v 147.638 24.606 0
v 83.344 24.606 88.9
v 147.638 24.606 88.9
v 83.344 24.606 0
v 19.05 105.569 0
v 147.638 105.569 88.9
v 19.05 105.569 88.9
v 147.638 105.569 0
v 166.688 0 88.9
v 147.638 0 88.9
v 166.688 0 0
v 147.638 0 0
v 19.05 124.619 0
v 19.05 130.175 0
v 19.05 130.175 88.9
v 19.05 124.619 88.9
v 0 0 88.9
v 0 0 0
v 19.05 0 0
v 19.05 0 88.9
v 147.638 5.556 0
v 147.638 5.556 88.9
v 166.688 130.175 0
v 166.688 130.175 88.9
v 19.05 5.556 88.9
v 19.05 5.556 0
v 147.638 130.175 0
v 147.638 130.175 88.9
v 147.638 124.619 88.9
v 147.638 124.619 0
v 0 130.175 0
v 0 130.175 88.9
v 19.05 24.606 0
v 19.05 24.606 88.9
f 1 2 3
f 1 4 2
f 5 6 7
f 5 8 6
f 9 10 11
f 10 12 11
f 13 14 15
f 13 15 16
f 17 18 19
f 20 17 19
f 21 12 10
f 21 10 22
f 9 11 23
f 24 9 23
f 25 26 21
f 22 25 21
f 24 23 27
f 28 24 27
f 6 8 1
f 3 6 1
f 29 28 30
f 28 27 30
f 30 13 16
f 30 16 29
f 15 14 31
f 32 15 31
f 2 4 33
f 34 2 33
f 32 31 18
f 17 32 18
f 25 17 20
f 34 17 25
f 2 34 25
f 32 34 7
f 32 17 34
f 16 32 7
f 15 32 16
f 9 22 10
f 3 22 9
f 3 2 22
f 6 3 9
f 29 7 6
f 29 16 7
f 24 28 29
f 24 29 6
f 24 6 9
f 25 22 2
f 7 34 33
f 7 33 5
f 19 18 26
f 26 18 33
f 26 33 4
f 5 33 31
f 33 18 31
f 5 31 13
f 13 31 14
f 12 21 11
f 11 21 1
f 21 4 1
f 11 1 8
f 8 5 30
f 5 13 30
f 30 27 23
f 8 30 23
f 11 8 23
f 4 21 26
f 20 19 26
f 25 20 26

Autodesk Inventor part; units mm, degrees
ref_plane "YZ Plane" through (0, 0, 0) normal (1, 0, 0) x (0, 1, 0)
ref_plane "XZ Plane" through (0, 0, 0) normal (0, 1, 0) x (-1, 0, 0)
ref_plane "XY Plane" through (0, 0, 0) normal (0, 0, 1) x (1, 0, 0)
sketch "Sketch1" plane through (0, 0, 0) normal (0, 0, 1) x (1, 0, 0)
  line L0 (0, 0) -> (166.6875, 0)
  line L1 (166.6875, 0) -> (166.6875, 130.175)
  line L2 (166.6875, 130.175) -> (0, 130.175)
  line L3 (0, 130.175) -> (0, 0)
  dimension "d0" = 166.6875
  dimension "d1" = 130.175
extrude "Extrusion1" add sketch "Sketch1" along normal blind 88.9
sketch "Sketch3" plane through (0, 0, 0) normal (0, 0, -1) x (-1, 0, 0)
  line L0 (-166.6875, 0) -> (-166.6875, 130.175) construction
  line L1 (0, 0) -> (-166.6875, 0) projected
  line L2 (0, 130.175) -> (0, 0) construction
  line L3 (-166.6875, 130.175) -> (0, 130.175) construction
  line L4 (-166.6875, 0) -> (-147.6375, 0) construction
  line L5 (-147.6375, 0) -> (-147.6375, 5.5563)
  line L6 (0, 0) -> (-166.6875, 0) construction
  line L7 (-83.3438, 0) -> (-83.3438, 30.0341) construction
  line L8 (-166.6875, 0) -> (0, 0) construction
  line L9 (0, 0) -> (-19.05, 0) construction
  line L10 (-19.05, 0) -> (-19.05, 5.5563)
  line L11 (-166.6875, 0) -> (0, 0) construction
  line L12 (-19.05, 5.5563) -> (-147.6375, 5.5563)
  line L13 (-147.6375, 5.5563) -> (-19.05, 5.5563)
  line L14 (-19.05, 5.5563) -> (-19.05, 0)
  line L15 (-19.05, 0) -> (-147.6375, 0)
  line L16 (-147.6375, 0) -> (-147.6375, 5.5563)
  line L17 (-166.6875, 65.0875) -> (-112.8864, 65.0875) construction
  line L18 (-147.6375, 130.175) -> (-147.6375, 124.6187)
  line L19 (-19.05, 130.175) -> (-19.05, 124.6187)
  line L20 (-19.05, 124.6187) -> (-147.6375, 124.6187)
  line L21 (-147.6375, 124.6187) -> (-19.05, 124.6187)
  line L22 (-19.05, 124.6187) -> (-19.05, 130.175)
  line L23 (-19.05, 130.175) -> (-147.6375, 130.175)
  line L24 (-147.6375, 130.175) -> (-147.6375, 124.6187)
  point P0 (-83.3438, 130.175)
extrude "Extrusion2" cut sketch "Sketch3" against normal through all
sketch "Sketch4" plane through (0, 0, 0) normal (0, 0, -1) x (-1, 0, 0)
  line L0 (-147.6375, 124.6187) -> (-147.6375, 130.175) projected
  line L1 (-166.6875, 130.175) -> (-147.6375, 130.175) projected
  line L2 (-166.6875, 0) -> (-166.6875, 130.175) projected
  line L3 (-147.6375, 0) -> (-166.6875, 0) projected
  line L4 (-147.6375, 0) -> (-147.6375, 5.5563) projected
  line L5 (-147.6375, 5.5563) -> (-19.05, 5.5563) projected
  line L6 (-19.05, 5.5563) -> (-19.05, 0) projected
  line L7 (0, 0) -> (-19.05, 0) projected
  line L8 (0, 130.175) -> (0, 0) projected
  line L9 (-19.05, 130.175) -> (0, 130.175) projected
  line L10 (-19.05, 130.175) -> (-19.05, 124.6187) projected
  line L11 (-19.05, 124.6187) -> (-147.6375, 124.6187) projected
  line L12 (-147.6375, 124.6187) -> (-147.6375, 5.5563) construction
  line L13 (-19.05, 5.5563) -> (-19.05, 124.6187) construction
  line L14 (-19.05, 124.6187) -> (-147.6375, 124.6187) construction
  line L15 (-83.3438, 124.6187) -> (-83.3438, 105.5687) construction
  line L16 (-83.3438, 105.5687) -> (-19.05, 105.5687)
  line L17 (-83.3438, 105.5687) -> (-147.6375, 105.5687)
  line L18 (-147.6375, 65.0875) -> (-19.05, 65.0875) construction
  line L19 (-83.3438, 24.6062) -> (-19.05, 24.6063)
  line L20 (-83.3438, 24.6062) -> (-147.6375, 24.6062)
  line L21 (-147.6375, 105.5687) -> (-147.6375, 24.6062)
  line L22 (-19.05, 24.6063) -> (-19.05, 105.5687)
  dimension "d8" = 19.05
extrude "Extrusion3" cut sketch "Sketch4" against normal through all contours L16 L22 L19 L20 L21 L17
properties part number "Magnet"
